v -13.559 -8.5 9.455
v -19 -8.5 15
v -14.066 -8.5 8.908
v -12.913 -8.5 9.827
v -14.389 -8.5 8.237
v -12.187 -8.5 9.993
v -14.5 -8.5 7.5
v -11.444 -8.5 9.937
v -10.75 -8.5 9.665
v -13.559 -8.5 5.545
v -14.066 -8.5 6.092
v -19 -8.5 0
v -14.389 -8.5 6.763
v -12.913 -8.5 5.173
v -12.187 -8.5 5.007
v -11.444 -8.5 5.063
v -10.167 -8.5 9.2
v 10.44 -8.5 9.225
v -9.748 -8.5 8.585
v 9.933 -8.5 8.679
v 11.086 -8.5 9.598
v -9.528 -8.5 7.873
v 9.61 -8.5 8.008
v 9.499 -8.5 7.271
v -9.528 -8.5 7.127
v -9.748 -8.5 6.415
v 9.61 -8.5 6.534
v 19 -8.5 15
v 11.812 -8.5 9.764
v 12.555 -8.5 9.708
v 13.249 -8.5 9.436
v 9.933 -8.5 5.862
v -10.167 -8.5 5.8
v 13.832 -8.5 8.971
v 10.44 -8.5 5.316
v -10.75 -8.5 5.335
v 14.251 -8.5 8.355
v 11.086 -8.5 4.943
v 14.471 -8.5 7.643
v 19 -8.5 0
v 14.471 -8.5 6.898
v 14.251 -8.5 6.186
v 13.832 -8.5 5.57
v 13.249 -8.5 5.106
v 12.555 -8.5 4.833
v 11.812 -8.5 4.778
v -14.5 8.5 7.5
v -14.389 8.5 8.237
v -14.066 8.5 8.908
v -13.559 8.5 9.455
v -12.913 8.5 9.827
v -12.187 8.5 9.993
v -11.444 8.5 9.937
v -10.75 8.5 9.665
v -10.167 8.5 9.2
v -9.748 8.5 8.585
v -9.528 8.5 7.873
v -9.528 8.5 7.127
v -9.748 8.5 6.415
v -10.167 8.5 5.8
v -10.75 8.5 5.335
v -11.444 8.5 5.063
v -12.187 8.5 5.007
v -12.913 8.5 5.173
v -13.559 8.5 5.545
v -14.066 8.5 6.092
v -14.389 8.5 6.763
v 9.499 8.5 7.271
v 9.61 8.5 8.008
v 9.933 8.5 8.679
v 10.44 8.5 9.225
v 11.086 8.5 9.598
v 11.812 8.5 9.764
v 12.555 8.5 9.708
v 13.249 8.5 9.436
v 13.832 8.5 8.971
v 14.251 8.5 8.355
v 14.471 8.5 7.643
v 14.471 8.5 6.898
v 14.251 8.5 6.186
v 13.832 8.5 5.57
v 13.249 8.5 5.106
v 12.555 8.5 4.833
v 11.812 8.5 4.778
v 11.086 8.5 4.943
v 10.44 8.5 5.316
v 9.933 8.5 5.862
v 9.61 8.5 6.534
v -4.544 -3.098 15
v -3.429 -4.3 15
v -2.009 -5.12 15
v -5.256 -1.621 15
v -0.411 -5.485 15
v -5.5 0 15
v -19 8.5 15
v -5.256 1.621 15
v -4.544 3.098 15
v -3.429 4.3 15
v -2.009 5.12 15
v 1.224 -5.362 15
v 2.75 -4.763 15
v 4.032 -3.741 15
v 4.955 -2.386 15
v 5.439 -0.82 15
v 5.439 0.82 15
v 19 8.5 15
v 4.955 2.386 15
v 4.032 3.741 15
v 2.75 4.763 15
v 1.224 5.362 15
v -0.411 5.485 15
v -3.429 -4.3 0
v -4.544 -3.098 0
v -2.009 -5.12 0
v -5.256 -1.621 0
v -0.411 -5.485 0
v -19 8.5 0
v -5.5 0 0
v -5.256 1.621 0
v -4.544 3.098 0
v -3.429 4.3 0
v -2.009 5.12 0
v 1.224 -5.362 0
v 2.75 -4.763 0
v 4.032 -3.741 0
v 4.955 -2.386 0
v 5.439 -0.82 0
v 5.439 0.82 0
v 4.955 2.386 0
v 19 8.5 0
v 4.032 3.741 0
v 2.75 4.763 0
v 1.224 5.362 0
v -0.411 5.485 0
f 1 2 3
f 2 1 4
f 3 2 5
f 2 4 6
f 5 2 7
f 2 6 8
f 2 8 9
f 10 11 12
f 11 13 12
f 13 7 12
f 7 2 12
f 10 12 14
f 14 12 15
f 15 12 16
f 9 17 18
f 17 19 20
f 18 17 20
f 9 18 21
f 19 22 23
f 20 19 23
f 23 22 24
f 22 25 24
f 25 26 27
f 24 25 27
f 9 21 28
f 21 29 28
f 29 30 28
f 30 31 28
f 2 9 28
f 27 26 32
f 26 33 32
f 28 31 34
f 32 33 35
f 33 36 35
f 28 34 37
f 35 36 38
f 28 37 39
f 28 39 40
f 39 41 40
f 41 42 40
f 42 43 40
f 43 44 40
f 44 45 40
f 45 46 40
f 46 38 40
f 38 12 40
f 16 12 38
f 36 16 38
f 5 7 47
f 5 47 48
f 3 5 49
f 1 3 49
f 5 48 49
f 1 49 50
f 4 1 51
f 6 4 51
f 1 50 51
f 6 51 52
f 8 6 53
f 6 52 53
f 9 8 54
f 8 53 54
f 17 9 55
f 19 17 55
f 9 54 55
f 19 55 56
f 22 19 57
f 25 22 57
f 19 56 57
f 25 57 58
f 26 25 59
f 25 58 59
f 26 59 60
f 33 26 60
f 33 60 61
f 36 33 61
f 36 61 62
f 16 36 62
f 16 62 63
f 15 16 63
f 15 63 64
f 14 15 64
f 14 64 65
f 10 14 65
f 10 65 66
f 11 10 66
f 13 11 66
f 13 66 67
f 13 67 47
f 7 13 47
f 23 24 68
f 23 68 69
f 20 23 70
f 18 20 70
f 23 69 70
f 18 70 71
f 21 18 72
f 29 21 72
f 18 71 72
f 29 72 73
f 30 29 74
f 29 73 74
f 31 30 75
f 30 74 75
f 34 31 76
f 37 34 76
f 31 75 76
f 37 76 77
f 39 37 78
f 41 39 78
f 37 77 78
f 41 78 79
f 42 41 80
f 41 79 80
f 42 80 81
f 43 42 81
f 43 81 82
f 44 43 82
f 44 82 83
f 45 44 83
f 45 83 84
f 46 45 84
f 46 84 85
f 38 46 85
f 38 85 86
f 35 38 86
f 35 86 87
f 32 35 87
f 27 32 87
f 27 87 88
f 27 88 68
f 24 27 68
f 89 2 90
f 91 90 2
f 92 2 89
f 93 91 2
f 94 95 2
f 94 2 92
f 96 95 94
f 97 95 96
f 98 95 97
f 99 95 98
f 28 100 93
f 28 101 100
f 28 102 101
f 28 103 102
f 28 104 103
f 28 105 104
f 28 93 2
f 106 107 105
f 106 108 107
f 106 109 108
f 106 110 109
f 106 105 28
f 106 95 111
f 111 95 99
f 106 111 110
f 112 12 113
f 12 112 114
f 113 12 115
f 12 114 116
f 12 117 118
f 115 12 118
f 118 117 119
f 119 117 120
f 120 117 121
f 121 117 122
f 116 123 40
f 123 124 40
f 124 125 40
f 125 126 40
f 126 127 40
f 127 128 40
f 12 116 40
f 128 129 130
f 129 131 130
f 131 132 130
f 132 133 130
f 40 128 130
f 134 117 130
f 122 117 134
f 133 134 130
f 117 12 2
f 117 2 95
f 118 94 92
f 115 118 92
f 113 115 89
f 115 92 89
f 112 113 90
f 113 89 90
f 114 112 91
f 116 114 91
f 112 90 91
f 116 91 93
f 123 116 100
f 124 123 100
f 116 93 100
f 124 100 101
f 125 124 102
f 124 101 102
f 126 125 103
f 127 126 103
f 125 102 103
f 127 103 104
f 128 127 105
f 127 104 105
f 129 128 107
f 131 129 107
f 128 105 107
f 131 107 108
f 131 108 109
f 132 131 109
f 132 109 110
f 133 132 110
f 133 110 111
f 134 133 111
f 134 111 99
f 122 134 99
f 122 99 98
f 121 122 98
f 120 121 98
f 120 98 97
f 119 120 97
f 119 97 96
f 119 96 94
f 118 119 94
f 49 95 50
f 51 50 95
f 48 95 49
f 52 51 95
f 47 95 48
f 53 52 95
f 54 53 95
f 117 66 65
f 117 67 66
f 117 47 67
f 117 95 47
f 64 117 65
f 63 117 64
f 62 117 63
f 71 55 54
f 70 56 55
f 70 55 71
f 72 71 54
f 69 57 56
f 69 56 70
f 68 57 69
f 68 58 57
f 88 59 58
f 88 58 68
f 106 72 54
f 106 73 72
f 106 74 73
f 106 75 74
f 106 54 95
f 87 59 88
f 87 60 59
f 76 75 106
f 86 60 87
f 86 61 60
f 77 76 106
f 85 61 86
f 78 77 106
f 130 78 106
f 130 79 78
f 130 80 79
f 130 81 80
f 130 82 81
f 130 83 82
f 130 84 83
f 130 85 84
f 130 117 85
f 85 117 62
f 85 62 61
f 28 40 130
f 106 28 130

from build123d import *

# Parameters (mm, degrees)
F0_W     = 38
F0_H     = 17
F1_DEPTH = 15
F3_D     = 11
F5_D     = 5


with BuildPart() as f1:
    # F0 (on Top) → F1 (new body)
    with BuildSketch(Plane.XY):
        Rectangle(F0_W, F0_H)
    extrude(amount=F1_DEPTH)

    # F3 (through all)
    with Locations(Plane(origin=(0, 0, 0), x_dir=(1, 0, 0), z_dir=(0, 0, -1))):
        with Locations((0, 0)):
            Hole(F3_D / 2)

    # F5 (through all)
    with Locations(Plane.XZ.offset(8.5)):
        with Locations((-12, 7.5), (11.998904, 7.270673)):
            Hole(F5_D / 2)


solid = f1.part
